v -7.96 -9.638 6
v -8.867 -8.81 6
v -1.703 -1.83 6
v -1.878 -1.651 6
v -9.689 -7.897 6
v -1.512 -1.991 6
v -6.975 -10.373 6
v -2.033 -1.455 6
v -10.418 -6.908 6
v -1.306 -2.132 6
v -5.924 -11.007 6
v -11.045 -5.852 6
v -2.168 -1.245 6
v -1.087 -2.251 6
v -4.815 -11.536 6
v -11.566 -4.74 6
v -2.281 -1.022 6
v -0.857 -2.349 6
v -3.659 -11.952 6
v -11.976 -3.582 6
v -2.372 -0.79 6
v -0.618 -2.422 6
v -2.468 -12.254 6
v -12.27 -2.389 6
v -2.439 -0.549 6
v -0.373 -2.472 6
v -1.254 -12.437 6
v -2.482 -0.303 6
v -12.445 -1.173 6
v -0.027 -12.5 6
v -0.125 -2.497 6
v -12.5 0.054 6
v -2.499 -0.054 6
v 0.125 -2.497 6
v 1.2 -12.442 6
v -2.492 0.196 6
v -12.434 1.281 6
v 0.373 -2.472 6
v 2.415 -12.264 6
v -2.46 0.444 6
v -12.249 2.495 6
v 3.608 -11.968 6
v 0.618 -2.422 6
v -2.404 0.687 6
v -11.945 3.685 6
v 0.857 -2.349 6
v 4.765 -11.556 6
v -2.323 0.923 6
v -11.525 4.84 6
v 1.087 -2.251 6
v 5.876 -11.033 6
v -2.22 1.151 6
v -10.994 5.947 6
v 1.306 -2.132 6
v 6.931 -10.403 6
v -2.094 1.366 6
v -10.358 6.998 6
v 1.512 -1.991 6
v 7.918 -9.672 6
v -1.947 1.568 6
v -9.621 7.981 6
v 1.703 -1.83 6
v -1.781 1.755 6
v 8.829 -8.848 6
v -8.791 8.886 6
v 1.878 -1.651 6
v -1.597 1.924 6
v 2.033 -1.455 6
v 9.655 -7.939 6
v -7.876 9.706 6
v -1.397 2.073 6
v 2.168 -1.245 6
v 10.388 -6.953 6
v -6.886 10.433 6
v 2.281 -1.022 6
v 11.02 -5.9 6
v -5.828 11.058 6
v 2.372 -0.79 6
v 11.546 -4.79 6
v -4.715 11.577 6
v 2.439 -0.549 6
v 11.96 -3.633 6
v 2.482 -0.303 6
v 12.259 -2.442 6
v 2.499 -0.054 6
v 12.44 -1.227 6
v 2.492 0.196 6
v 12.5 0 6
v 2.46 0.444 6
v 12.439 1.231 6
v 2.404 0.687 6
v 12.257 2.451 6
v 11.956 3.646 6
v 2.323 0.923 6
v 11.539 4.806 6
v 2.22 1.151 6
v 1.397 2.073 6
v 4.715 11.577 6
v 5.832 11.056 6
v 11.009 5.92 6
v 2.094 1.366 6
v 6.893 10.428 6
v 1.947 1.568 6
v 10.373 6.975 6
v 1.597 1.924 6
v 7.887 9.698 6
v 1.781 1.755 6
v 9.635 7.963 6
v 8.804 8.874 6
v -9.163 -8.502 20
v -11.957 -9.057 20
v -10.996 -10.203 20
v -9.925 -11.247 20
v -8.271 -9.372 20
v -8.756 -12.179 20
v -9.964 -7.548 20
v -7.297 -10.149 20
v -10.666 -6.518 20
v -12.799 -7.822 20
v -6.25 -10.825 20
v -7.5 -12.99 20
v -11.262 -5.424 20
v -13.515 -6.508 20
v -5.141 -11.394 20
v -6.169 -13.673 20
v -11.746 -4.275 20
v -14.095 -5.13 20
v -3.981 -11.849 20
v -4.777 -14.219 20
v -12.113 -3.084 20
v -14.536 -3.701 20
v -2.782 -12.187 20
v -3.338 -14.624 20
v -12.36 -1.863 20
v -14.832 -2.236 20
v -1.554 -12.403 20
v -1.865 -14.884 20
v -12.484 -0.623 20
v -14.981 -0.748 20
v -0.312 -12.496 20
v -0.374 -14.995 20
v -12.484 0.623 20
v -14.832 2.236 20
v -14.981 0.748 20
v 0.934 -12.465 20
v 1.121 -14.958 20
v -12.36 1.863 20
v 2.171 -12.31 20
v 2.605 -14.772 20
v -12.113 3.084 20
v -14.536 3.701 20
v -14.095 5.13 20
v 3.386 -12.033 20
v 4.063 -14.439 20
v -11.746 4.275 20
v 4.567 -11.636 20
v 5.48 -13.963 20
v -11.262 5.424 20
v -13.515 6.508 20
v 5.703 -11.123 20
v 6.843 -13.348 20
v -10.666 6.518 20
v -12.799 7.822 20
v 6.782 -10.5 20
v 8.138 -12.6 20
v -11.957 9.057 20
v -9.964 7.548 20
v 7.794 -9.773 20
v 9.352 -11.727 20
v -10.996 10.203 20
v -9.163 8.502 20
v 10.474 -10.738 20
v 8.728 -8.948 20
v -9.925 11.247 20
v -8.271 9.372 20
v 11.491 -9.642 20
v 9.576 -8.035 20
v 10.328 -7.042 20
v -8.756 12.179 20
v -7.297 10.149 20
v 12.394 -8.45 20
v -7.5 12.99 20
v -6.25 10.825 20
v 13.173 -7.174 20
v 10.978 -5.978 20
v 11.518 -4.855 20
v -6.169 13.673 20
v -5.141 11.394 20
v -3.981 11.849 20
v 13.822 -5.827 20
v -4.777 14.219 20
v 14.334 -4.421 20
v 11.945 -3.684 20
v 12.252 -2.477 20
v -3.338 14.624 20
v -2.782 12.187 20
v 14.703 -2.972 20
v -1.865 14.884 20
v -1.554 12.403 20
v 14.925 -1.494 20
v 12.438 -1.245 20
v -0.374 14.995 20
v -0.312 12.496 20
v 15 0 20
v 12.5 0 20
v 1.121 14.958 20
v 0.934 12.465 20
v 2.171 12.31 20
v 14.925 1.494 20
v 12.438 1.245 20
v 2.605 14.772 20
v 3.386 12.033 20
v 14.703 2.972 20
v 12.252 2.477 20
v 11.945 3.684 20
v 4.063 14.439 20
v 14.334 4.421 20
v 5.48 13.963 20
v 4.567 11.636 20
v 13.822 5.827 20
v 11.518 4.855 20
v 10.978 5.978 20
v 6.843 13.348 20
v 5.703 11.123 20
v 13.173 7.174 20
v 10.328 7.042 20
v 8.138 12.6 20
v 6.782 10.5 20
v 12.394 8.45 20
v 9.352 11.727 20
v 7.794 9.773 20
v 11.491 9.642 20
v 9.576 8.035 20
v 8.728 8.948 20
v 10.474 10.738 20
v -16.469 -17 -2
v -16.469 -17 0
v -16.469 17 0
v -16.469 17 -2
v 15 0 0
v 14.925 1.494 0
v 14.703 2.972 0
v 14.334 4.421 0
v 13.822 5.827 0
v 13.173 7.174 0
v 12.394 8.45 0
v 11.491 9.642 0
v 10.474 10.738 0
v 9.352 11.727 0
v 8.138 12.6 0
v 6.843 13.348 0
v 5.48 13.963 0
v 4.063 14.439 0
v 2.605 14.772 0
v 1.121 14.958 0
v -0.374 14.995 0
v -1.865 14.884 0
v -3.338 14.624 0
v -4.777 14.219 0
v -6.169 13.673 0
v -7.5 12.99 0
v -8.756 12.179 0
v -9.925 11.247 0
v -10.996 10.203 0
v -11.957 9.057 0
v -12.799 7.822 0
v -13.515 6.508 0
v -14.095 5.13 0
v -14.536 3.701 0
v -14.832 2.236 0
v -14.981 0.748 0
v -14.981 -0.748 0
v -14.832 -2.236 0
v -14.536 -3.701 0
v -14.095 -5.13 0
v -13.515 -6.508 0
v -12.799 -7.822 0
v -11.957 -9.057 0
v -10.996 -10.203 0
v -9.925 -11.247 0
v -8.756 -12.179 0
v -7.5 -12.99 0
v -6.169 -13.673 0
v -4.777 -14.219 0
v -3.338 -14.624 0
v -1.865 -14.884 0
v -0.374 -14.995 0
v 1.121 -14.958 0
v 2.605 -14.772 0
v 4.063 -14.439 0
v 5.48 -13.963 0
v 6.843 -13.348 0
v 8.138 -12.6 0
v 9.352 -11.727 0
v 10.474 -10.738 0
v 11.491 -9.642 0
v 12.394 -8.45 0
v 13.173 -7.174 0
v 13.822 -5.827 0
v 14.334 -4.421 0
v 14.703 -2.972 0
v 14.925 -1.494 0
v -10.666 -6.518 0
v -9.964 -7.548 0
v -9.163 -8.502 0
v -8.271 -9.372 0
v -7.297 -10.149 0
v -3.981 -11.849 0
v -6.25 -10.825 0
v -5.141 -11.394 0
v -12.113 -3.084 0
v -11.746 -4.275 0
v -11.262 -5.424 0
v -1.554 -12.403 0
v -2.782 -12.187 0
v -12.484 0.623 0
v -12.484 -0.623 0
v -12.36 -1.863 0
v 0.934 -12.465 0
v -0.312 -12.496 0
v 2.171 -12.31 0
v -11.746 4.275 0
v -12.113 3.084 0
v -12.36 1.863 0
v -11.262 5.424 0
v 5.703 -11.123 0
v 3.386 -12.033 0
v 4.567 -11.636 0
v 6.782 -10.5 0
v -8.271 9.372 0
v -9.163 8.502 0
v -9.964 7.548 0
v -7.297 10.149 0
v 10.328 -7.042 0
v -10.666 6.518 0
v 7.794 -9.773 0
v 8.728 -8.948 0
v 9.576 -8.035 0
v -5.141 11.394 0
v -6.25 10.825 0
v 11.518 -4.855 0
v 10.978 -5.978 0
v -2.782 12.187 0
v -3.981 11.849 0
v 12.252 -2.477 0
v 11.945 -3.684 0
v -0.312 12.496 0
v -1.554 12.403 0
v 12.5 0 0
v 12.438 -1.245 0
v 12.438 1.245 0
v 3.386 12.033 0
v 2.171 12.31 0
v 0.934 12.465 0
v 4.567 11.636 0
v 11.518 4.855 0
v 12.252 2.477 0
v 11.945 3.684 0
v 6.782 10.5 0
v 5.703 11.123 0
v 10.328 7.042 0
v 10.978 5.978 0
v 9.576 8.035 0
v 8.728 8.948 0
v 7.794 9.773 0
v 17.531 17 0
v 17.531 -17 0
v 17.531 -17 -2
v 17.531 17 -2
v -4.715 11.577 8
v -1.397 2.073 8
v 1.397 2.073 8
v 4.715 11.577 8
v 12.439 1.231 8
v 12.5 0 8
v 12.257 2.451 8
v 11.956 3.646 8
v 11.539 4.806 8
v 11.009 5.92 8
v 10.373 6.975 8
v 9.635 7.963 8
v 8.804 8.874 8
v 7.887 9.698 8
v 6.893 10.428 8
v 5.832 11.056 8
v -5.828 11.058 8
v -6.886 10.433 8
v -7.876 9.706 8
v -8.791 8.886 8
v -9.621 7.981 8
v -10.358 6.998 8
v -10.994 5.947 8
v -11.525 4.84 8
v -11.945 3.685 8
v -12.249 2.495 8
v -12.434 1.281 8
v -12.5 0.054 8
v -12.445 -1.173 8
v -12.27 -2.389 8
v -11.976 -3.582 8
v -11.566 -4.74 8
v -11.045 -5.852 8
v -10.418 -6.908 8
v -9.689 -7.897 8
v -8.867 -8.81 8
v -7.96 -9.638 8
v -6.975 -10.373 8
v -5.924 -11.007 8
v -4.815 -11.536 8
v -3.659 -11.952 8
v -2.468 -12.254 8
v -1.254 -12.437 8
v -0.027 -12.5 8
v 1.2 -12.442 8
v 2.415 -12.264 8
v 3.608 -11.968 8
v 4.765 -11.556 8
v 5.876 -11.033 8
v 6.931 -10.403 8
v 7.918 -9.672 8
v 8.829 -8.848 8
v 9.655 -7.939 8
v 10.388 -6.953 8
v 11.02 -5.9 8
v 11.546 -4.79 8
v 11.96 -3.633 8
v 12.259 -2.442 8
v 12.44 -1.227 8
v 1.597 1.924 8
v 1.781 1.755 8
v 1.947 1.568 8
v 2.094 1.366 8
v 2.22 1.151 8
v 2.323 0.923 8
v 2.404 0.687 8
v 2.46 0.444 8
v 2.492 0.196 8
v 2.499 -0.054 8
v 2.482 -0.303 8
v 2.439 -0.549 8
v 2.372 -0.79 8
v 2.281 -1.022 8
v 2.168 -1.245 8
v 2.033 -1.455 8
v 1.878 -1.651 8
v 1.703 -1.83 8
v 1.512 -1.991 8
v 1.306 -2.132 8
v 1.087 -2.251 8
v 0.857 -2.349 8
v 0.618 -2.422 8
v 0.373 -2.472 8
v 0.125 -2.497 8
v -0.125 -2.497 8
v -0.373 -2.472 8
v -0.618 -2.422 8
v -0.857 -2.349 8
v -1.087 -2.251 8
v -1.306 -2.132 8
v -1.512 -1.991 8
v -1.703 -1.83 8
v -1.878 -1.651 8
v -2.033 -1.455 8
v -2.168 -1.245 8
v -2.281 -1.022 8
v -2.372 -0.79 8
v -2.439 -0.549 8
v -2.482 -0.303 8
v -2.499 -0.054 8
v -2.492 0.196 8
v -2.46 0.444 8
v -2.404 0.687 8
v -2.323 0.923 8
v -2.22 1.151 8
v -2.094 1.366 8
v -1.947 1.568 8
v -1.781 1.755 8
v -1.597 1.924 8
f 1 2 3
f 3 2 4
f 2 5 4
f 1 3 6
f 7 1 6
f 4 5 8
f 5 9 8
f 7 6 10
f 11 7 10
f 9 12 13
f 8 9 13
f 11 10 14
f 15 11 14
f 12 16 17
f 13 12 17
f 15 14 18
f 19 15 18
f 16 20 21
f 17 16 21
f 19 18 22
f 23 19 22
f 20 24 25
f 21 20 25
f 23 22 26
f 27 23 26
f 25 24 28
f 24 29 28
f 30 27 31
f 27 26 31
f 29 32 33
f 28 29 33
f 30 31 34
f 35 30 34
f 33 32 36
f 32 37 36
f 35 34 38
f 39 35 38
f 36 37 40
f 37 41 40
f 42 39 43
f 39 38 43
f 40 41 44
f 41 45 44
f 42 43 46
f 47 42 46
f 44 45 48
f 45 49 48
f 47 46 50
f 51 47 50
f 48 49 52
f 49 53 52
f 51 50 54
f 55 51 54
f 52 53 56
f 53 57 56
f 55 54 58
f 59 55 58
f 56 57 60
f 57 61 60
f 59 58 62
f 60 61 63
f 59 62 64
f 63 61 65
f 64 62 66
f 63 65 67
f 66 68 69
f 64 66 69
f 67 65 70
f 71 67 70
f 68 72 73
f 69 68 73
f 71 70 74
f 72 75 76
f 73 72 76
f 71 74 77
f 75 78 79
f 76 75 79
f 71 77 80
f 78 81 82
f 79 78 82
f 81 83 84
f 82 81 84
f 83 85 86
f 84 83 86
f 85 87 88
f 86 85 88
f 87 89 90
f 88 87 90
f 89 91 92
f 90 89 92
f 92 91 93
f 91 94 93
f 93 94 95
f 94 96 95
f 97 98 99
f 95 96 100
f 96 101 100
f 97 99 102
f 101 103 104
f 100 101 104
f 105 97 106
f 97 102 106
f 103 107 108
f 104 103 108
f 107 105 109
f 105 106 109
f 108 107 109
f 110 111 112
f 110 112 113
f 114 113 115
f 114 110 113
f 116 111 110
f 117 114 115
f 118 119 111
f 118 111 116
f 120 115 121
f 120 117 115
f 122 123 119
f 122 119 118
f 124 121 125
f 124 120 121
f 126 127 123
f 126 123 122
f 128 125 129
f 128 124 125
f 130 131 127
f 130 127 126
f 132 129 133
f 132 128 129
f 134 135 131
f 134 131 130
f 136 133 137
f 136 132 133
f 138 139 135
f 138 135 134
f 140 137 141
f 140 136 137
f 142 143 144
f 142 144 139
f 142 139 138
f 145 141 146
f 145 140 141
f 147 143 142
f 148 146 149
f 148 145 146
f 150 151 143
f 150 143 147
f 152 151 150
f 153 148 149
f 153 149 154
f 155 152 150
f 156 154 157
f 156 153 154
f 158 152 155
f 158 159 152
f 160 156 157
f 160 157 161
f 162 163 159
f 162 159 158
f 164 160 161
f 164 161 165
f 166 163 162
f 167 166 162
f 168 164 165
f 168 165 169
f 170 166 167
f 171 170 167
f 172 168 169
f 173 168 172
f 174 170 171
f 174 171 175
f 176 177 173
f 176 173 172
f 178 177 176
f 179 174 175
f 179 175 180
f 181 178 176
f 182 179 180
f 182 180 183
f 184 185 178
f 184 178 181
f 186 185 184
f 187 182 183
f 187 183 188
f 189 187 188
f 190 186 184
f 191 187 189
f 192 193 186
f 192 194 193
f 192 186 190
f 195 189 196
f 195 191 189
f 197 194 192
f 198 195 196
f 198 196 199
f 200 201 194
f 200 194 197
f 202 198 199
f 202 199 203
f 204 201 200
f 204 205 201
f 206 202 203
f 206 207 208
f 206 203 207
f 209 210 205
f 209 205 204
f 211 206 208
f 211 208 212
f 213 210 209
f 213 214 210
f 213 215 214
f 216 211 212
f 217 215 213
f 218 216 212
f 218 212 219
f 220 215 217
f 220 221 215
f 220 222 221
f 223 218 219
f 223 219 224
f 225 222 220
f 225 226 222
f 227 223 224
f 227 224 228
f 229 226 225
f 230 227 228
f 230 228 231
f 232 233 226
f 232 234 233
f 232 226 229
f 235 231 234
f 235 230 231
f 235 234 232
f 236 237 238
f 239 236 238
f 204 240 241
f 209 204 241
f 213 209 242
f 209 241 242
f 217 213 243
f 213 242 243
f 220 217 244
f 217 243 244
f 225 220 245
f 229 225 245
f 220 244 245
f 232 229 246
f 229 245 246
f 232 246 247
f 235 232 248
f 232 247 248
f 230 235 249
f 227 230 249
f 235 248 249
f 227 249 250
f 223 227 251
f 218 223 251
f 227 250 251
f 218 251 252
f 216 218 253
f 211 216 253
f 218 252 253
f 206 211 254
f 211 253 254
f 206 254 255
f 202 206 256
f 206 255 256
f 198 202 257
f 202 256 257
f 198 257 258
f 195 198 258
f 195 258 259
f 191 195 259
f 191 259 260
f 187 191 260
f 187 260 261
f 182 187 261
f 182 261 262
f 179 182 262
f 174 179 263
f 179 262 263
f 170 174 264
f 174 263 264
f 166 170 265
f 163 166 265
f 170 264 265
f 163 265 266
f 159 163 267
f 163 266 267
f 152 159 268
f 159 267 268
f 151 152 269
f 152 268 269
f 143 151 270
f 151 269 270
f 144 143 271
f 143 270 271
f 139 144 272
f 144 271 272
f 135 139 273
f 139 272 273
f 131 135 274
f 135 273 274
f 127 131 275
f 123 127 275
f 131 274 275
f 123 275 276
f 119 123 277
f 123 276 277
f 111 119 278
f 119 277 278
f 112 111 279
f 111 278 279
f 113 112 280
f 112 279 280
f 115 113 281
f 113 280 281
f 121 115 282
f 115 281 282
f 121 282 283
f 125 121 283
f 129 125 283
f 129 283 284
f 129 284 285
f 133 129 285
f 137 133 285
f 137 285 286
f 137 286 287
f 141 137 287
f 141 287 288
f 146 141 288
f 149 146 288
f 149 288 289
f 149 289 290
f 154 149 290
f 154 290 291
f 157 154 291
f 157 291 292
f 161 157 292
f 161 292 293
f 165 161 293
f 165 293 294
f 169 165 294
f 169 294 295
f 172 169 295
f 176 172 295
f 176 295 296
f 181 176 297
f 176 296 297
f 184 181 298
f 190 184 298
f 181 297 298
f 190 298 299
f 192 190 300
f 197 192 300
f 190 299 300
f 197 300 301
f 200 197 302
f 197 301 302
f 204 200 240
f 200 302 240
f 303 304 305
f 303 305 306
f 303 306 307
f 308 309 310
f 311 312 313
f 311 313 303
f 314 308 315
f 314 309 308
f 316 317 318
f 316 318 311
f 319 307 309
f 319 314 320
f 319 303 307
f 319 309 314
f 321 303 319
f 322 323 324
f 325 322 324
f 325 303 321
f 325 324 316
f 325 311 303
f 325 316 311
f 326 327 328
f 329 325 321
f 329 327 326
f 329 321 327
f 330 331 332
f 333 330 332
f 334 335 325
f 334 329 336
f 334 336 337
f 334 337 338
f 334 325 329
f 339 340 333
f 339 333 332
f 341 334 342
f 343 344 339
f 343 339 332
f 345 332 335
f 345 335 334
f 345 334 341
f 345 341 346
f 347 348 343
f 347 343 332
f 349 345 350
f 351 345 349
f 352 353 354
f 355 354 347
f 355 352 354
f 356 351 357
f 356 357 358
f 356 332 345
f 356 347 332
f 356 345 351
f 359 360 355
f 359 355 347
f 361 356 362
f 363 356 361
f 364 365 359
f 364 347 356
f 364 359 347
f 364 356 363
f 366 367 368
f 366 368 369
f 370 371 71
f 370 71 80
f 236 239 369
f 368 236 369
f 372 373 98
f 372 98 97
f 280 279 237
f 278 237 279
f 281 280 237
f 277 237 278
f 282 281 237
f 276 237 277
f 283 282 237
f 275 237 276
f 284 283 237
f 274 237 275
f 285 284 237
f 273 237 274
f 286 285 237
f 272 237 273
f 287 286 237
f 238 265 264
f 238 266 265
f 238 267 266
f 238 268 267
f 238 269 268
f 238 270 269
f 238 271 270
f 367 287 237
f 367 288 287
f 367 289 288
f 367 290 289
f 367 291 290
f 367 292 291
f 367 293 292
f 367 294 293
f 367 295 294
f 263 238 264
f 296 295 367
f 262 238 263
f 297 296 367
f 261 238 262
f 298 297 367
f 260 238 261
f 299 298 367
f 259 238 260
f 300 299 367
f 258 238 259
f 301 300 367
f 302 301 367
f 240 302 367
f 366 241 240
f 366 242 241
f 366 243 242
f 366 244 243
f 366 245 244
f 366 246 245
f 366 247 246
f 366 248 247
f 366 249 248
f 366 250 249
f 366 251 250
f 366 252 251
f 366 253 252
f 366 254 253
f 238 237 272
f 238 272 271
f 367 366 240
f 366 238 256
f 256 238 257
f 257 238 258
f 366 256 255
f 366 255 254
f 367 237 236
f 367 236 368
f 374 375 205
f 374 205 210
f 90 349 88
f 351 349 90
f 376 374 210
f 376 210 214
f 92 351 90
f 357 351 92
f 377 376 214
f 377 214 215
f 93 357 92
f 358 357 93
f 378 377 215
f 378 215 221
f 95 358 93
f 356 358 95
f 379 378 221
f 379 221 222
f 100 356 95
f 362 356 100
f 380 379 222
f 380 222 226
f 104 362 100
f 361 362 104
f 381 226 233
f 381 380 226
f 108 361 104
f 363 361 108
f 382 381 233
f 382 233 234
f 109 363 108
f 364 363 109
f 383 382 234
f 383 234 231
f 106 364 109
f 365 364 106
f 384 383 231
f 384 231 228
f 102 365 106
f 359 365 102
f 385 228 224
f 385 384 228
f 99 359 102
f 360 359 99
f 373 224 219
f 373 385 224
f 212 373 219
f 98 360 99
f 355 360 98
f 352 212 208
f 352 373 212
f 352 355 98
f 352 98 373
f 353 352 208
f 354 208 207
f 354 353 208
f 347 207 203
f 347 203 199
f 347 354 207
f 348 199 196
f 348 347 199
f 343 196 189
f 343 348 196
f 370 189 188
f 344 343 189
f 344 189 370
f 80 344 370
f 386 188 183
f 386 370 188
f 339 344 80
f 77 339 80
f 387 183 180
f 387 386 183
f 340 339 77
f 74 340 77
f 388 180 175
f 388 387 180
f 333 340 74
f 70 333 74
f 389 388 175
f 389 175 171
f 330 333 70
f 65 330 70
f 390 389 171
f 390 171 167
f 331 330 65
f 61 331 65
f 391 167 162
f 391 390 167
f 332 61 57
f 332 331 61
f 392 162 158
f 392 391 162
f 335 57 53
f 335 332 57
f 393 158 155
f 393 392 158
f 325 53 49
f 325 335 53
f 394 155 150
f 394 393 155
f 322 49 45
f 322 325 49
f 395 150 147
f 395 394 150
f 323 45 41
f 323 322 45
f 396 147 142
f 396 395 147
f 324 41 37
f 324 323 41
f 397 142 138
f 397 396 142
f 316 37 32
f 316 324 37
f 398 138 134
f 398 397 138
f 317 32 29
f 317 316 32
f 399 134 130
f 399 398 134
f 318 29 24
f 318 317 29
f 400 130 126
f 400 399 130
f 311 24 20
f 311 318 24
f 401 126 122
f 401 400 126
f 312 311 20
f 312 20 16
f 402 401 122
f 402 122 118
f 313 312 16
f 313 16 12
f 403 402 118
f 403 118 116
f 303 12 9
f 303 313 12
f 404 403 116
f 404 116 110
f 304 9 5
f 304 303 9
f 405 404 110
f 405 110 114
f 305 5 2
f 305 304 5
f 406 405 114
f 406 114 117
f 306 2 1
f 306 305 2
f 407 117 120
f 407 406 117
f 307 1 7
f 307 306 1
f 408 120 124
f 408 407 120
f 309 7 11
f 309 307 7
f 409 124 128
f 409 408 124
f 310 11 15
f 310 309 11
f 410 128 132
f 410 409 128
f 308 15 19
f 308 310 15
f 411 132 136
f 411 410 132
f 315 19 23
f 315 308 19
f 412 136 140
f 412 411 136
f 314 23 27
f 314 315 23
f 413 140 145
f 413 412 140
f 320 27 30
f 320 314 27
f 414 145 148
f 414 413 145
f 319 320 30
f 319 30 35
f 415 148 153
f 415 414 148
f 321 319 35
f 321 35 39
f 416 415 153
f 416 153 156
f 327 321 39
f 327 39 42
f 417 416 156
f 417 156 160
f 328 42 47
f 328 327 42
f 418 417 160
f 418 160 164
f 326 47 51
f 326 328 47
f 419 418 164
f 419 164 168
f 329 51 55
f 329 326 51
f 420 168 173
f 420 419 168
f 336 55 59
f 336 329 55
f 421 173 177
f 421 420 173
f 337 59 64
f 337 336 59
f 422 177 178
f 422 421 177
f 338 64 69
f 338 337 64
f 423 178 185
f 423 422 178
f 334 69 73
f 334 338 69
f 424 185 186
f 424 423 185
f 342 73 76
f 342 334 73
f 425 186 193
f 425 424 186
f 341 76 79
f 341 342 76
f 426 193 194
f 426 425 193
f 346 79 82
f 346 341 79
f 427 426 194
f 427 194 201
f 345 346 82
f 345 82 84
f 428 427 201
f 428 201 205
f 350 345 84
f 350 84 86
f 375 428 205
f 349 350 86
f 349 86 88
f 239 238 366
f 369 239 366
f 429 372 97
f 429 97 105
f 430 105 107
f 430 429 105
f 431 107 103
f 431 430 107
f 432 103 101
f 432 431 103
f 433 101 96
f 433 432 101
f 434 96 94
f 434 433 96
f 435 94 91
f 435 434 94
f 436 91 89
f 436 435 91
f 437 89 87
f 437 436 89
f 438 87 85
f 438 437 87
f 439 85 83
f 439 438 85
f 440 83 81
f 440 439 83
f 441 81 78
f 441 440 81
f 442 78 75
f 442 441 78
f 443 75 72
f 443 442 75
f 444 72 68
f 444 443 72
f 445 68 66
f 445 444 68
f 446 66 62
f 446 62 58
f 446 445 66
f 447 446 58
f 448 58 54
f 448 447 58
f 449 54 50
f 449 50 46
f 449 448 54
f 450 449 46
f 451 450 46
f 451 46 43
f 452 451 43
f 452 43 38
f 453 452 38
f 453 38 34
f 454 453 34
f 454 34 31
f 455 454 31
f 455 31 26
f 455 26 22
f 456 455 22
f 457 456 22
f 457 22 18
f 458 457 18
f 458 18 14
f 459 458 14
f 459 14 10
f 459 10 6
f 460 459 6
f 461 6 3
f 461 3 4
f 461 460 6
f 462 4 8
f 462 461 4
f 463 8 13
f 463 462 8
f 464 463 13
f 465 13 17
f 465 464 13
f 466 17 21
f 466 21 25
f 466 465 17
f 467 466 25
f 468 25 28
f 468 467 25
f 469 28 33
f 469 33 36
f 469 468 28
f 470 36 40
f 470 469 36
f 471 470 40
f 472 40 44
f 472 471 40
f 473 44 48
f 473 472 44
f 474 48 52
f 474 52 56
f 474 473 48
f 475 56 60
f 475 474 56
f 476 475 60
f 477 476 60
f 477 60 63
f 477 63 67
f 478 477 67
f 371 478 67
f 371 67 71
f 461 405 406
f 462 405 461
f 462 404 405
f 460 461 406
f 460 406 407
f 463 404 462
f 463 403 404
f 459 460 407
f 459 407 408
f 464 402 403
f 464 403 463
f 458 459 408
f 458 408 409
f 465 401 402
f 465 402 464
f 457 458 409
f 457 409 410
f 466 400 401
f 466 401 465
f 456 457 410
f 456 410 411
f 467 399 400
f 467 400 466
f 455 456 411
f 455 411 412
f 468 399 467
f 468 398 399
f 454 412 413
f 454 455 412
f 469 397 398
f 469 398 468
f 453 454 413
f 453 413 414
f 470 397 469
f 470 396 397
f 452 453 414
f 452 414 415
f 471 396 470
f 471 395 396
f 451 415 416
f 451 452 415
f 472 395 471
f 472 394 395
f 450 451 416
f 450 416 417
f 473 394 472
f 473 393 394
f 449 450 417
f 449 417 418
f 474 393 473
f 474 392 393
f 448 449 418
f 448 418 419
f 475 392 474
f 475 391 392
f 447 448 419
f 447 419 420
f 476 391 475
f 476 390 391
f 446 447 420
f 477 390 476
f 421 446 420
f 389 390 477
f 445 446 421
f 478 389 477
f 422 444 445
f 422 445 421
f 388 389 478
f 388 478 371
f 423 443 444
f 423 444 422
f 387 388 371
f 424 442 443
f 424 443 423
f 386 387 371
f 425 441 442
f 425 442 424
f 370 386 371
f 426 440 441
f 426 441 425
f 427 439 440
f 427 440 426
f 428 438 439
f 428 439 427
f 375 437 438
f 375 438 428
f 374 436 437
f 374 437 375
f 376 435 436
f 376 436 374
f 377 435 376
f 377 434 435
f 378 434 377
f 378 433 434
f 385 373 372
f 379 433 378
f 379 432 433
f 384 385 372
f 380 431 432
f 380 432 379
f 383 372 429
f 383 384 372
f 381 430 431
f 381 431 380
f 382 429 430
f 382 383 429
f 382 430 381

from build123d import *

# Parameters (mm, degrees)
F0_R     = 15
F0_R_2   = 12.5
F1_DEPTH = 20
F4_DEPTH = 2
F5_W     = 34
F5_H     = 34
F6_DEPTH = 2


with BuildPart() as f1:
    # F0 (on Top) → F1 (new body)
    with BuildSketch(Plane.XY):
        Circle(F0_R)
        Circle(F0_R_2, mode=Mode.SUBTRACT)
    extrude(amount=F1_DEPTH)

    # F3 (on offset) → F4 (join)
    with BuildSketch(Plane.XY.offset(8)):
        with BuildLine():
            ThreePointArc((1.396739, 2.073432), (0, -2.5), (-1.396739, 2.073432))
            Line((-1.396739, 2.073432), (-4.714967, 11.576661))
            ThreePointArc((-4.714967, 11.576661), (0, -12.5), (4.714967, 11.576661))
            Line((4.714967, 11.576661), (1.396739, 2.073432))
        make_face()
    extrude(amount=-F4_DEPTH)

    # F5 (on Top) → F6 (join)
    with BuildSketch(Plane.XY):
        with Locations((0.530663, 0)):
            Rectangle(F5_W, F5_H)
    extrude(amount=-F6_DEPTH)


solid = f1.part
